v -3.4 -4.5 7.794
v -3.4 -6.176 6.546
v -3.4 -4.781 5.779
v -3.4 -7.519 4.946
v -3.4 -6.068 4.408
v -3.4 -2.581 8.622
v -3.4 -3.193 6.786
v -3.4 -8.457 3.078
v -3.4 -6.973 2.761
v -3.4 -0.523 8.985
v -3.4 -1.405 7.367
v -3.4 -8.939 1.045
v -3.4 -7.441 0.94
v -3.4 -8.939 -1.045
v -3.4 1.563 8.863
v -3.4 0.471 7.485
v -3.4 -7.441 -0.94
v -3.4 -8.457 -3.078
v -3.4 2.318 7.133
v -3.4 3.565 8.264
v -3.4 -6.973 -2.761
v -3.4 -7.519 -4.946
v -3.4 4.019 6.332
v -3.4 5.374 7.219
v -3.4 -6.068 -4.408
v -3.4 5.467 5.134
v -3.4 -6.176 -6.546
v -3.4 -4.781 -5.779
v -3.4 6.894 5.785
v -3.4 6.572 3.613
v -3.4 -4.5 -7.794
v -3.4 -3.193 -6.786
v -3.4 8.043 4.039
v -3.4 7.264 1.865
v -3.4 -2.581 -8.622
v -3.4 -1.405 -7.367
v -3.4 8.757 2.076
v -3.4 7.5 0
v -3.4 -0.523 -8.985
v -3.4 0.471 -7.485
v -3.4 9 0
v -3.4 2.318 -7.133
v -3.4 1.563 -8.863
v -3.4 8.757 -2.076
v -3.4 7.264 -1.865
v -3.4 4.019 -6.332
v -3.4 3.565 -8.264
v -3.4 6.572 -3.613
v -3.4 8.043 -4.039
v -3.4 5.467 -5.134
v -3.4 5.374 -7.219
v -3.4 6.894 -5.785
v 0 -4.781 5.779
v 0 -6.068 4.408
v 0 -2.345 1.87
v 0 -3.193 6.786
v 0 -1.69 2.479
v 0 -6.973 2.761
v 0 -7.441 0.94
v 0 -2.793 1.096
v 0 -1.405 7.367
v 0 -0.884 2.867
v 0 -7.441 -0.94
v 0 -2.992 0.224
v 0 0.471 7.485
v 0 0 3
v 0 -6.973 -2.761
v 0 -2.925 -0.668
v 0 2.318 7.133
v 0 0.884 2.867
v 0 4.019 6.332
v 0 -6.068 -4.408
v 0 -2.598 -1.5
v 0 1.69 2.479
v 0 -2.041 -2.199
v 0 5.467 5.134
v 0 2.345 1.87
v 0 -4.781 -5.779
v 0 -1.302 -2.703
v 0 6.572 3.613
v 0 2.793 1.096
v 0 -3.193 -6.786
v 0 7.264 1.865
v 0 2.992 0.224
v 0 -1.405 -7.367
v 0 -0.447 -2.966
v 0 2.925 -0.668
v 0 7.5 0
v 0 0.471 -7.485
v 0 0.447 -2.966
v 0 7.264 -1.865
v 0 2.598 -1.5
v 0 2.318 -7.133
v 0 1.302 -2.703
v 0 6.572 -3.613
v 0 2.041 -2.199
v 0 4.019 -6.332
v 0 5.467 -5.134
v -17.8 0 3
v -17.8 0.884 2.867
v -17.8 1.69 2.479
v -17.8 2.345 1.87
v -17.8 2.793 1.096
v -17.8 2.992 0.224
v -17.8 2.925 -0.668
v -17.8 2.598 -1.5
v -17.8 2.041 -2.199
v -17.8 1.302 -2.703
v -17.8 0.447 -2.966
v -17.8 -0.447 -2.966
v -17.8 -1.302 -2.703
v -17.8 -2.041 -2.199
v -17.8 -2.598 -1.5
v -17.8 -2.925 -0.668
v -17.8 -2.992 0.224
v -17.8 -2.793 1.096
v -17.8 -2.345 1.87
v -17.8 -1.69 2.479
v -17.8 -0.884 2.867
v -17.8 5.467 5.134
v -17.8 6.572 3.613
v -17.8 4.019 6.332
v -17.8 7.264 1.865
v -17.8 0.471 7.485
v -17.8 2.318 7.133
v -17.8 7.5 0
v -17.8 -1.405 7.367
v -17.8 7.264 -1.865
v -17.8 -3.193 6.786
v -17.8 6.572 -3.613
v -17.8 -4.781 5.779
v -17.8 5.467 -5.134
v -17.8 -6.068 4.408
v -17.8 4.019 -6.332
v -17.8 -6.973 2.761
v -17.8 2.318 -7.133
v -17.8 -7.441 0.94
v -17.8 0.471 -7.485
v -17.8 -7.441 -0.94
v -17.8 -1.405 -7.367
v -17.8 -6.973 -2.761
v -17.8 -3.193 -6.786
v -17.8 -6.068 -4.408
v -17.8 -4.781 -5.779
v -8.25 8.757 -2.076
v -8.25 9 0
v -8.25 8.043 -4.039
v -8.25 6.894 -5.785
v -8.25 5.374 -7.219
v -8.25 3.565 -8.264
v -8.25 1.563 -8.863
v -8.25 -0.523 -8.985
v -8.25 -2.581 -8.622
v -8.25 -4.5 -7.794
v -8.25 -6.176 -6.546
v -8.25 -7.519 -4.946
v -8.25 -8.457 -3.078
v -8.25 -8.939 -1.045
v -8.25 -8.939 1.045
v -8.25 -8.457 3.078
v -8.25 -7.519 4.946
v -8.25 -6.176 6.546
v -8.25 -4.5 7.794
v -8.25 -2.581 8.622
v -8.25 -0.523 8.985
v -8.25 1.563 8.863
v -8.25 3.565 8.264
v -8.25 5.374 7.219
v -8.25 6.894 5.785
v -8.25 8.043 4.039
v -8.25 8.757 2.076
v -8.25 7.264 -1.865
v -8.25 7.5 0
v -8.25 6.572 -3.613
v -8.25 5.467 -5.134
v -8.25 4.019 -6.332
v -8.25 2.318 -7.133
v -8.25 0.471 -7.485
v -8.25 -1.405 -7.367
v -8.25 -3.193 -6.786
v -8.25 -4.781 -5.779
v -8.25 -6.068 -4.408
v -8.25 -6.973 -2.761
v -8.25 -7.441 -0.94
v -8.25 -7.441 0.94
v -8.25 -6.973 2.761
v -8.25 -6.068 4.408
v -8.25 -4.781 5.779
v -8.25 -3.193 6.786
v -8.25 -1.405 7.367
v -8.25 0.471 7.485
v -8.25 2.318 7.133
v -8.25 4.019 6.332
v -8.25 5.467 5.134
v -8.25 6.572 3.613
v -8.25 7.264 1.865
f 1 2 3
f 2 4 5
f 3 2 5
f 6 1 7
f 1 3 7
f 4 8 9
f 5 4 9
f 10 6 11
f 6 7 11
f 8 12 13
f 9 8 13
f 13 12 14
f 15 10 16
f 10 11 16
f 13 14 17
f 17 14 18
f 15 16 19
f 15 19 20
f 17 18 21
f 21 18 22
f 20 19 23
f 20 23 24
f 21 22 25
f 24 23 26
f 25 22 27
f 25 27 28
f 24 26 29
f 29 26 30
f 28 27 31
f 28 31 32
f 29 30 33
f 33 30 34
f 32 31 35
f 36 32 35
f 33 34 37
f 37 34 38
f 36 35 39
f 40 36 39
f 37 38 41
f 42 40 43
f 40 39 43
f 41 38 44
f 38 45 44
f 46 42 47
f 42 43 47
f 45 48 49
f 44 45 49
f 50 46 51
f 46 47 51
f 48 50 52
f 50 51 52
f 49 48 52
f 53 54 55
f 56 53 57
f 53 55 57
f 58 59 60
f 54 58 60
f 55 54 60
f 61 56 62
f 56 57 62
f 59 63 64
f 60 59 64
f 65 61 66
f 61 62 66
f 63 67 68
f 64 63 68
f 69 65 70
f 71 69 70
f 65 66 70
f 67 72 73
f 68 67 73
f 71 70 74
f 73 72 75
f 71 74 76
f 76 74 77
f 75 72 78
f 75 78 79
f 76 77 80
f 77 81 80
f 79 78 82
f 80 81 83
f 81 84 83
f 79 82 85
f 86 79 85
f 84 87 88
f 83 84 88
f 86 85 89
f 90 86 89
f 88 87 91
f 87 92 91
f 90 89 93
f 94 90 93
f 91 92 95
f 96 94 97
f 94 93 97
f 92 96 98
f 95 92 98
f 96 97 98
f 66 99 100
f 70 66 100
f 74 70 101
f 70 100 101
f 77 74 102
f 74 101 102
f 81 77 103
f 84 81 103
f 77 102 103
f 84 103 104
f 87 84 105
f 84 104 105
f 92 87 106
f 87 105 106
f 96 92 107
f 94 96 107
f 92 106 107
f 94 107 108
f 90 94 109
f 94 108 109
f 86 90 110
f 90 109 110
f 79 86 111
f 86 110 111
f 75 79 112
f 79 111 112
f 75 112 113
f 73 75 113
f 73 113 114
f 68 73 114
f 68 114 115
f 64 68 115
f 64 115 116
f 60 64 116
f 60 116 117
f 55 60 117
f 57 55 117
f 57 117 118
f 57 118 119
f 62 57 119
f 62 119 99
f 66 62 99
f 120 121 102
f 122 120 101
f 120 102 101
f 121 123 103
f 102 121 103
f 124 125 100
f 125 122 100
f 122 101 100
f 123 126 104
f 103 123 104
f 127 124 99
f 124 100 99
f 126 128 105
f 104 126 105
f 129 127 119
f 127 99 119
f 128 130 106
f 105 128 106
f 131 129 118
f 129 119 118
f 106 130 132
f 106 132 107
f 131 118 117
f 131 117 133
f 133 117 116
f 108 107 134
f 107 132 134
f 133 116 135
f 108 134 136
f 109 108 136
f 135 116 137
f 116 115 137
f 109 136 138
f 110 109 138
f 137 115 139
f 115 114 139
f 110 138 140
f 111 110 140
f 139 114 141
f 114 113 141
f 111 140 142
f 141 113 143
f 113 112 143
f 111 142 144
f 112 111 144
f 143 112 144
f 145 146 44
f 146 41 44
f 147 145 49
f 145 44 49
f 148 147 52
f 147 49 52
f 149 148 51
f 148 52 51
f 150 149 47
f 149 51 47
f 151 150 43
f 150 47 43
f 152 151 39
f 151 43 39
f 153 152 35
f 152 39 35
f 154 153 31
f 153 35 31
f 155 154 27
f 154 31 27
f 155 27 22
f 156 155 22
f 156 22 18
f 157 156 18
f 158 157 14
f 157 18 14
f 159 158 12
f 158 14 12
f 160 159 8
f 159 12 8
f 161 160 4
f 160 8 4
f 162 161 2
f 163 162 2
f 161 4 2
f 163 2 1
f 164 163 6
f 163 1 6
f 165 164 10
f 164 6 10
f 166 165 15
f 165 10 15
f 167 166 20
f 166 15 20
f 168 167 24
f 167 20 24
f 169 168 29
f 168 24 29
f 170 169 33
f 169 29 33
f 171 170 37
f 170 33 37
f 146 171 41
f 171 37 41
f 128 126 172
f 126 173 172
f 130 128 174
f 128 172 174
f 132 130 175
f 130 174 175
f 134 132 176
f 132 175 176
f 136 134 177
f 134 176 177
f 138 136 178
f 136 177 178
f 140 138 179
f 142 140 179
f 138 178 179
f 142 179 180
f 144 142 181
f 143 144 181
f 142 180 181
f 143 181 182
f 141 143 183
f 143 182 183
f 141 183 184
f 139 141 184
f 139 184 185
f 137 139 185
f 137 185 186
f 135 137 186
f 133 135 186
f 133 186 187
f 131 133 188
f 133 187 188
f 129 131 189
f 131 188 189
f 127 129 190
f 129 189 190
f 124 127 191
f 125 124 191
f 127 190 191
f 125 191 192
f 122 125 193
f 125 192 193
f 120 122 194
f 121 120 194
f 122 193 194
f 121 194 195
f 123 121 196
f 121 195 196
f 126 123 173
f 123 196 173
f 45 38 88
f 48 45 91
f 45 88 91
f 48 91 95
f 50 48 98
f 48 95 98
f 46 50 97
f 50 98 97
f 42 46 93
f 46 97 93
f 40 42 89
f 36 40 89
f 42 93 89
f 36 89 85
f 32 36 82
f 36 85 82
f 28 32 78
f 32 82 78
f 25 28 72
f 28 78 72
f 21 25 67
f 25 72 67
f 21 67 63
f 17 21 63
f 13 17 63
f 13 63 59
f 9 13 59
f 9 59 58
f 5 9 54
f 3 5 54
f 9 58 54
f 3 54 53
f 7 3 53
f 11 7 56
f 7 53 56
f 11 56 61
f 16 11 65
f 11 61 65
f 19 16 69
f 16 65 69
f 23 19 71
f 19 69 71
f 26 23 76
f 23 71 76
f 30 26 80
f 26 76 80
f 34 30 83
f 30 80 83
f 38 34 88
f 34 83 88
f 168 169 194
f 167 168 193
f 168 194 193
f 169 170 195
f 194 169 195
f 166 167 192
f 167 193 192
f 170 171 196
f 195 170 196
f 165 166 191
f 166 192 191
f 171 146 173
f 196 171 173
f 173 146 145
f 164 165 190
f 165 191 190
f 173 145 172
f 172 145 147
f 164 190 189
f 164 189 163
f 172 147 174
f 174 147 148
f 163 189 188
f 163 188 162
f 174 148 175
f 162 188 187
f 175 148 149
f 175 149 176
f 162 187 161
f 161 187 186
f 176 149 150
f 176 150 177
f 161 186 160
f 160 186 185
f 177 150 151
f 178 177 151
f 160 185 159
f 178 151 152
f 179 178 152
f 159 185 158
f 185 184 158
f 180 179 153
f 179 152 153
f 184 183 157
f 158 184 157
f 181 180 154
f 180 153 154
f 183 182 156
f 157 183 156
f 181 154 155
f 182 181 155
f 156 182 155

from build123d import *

# Parameters (mm, degrees)
SKETCH2_R          = 3
CUT_EXTRUDE1_DEPTH = 18.8


with BuildPart() as part:
    # Sketch1 → Revolve1 (revolve)
    with BuildSketch(Plane.XY):
        Polygon((-17.8, 0), (-17.8, 7.5), (-8.25, 7.5), (-8.25, 9), (-3.4, 9), (-3.4, 7.5), (0, 7.5), (0, 0), align=None)
    revolve(axis=Axis((0, 0, 0), (-1, 0, 0)))

    # Sketch2 → Cut-Extrude1 (cut, through all)
    with BuildSketch(Plane.ZY.offset(17.8)):
        Circle(SKETCH2_R)
    extrude(amount=-CUT_EXTRUDE1_DEPTH, mode=Mode.SUBTRACT)


solid = part.part
